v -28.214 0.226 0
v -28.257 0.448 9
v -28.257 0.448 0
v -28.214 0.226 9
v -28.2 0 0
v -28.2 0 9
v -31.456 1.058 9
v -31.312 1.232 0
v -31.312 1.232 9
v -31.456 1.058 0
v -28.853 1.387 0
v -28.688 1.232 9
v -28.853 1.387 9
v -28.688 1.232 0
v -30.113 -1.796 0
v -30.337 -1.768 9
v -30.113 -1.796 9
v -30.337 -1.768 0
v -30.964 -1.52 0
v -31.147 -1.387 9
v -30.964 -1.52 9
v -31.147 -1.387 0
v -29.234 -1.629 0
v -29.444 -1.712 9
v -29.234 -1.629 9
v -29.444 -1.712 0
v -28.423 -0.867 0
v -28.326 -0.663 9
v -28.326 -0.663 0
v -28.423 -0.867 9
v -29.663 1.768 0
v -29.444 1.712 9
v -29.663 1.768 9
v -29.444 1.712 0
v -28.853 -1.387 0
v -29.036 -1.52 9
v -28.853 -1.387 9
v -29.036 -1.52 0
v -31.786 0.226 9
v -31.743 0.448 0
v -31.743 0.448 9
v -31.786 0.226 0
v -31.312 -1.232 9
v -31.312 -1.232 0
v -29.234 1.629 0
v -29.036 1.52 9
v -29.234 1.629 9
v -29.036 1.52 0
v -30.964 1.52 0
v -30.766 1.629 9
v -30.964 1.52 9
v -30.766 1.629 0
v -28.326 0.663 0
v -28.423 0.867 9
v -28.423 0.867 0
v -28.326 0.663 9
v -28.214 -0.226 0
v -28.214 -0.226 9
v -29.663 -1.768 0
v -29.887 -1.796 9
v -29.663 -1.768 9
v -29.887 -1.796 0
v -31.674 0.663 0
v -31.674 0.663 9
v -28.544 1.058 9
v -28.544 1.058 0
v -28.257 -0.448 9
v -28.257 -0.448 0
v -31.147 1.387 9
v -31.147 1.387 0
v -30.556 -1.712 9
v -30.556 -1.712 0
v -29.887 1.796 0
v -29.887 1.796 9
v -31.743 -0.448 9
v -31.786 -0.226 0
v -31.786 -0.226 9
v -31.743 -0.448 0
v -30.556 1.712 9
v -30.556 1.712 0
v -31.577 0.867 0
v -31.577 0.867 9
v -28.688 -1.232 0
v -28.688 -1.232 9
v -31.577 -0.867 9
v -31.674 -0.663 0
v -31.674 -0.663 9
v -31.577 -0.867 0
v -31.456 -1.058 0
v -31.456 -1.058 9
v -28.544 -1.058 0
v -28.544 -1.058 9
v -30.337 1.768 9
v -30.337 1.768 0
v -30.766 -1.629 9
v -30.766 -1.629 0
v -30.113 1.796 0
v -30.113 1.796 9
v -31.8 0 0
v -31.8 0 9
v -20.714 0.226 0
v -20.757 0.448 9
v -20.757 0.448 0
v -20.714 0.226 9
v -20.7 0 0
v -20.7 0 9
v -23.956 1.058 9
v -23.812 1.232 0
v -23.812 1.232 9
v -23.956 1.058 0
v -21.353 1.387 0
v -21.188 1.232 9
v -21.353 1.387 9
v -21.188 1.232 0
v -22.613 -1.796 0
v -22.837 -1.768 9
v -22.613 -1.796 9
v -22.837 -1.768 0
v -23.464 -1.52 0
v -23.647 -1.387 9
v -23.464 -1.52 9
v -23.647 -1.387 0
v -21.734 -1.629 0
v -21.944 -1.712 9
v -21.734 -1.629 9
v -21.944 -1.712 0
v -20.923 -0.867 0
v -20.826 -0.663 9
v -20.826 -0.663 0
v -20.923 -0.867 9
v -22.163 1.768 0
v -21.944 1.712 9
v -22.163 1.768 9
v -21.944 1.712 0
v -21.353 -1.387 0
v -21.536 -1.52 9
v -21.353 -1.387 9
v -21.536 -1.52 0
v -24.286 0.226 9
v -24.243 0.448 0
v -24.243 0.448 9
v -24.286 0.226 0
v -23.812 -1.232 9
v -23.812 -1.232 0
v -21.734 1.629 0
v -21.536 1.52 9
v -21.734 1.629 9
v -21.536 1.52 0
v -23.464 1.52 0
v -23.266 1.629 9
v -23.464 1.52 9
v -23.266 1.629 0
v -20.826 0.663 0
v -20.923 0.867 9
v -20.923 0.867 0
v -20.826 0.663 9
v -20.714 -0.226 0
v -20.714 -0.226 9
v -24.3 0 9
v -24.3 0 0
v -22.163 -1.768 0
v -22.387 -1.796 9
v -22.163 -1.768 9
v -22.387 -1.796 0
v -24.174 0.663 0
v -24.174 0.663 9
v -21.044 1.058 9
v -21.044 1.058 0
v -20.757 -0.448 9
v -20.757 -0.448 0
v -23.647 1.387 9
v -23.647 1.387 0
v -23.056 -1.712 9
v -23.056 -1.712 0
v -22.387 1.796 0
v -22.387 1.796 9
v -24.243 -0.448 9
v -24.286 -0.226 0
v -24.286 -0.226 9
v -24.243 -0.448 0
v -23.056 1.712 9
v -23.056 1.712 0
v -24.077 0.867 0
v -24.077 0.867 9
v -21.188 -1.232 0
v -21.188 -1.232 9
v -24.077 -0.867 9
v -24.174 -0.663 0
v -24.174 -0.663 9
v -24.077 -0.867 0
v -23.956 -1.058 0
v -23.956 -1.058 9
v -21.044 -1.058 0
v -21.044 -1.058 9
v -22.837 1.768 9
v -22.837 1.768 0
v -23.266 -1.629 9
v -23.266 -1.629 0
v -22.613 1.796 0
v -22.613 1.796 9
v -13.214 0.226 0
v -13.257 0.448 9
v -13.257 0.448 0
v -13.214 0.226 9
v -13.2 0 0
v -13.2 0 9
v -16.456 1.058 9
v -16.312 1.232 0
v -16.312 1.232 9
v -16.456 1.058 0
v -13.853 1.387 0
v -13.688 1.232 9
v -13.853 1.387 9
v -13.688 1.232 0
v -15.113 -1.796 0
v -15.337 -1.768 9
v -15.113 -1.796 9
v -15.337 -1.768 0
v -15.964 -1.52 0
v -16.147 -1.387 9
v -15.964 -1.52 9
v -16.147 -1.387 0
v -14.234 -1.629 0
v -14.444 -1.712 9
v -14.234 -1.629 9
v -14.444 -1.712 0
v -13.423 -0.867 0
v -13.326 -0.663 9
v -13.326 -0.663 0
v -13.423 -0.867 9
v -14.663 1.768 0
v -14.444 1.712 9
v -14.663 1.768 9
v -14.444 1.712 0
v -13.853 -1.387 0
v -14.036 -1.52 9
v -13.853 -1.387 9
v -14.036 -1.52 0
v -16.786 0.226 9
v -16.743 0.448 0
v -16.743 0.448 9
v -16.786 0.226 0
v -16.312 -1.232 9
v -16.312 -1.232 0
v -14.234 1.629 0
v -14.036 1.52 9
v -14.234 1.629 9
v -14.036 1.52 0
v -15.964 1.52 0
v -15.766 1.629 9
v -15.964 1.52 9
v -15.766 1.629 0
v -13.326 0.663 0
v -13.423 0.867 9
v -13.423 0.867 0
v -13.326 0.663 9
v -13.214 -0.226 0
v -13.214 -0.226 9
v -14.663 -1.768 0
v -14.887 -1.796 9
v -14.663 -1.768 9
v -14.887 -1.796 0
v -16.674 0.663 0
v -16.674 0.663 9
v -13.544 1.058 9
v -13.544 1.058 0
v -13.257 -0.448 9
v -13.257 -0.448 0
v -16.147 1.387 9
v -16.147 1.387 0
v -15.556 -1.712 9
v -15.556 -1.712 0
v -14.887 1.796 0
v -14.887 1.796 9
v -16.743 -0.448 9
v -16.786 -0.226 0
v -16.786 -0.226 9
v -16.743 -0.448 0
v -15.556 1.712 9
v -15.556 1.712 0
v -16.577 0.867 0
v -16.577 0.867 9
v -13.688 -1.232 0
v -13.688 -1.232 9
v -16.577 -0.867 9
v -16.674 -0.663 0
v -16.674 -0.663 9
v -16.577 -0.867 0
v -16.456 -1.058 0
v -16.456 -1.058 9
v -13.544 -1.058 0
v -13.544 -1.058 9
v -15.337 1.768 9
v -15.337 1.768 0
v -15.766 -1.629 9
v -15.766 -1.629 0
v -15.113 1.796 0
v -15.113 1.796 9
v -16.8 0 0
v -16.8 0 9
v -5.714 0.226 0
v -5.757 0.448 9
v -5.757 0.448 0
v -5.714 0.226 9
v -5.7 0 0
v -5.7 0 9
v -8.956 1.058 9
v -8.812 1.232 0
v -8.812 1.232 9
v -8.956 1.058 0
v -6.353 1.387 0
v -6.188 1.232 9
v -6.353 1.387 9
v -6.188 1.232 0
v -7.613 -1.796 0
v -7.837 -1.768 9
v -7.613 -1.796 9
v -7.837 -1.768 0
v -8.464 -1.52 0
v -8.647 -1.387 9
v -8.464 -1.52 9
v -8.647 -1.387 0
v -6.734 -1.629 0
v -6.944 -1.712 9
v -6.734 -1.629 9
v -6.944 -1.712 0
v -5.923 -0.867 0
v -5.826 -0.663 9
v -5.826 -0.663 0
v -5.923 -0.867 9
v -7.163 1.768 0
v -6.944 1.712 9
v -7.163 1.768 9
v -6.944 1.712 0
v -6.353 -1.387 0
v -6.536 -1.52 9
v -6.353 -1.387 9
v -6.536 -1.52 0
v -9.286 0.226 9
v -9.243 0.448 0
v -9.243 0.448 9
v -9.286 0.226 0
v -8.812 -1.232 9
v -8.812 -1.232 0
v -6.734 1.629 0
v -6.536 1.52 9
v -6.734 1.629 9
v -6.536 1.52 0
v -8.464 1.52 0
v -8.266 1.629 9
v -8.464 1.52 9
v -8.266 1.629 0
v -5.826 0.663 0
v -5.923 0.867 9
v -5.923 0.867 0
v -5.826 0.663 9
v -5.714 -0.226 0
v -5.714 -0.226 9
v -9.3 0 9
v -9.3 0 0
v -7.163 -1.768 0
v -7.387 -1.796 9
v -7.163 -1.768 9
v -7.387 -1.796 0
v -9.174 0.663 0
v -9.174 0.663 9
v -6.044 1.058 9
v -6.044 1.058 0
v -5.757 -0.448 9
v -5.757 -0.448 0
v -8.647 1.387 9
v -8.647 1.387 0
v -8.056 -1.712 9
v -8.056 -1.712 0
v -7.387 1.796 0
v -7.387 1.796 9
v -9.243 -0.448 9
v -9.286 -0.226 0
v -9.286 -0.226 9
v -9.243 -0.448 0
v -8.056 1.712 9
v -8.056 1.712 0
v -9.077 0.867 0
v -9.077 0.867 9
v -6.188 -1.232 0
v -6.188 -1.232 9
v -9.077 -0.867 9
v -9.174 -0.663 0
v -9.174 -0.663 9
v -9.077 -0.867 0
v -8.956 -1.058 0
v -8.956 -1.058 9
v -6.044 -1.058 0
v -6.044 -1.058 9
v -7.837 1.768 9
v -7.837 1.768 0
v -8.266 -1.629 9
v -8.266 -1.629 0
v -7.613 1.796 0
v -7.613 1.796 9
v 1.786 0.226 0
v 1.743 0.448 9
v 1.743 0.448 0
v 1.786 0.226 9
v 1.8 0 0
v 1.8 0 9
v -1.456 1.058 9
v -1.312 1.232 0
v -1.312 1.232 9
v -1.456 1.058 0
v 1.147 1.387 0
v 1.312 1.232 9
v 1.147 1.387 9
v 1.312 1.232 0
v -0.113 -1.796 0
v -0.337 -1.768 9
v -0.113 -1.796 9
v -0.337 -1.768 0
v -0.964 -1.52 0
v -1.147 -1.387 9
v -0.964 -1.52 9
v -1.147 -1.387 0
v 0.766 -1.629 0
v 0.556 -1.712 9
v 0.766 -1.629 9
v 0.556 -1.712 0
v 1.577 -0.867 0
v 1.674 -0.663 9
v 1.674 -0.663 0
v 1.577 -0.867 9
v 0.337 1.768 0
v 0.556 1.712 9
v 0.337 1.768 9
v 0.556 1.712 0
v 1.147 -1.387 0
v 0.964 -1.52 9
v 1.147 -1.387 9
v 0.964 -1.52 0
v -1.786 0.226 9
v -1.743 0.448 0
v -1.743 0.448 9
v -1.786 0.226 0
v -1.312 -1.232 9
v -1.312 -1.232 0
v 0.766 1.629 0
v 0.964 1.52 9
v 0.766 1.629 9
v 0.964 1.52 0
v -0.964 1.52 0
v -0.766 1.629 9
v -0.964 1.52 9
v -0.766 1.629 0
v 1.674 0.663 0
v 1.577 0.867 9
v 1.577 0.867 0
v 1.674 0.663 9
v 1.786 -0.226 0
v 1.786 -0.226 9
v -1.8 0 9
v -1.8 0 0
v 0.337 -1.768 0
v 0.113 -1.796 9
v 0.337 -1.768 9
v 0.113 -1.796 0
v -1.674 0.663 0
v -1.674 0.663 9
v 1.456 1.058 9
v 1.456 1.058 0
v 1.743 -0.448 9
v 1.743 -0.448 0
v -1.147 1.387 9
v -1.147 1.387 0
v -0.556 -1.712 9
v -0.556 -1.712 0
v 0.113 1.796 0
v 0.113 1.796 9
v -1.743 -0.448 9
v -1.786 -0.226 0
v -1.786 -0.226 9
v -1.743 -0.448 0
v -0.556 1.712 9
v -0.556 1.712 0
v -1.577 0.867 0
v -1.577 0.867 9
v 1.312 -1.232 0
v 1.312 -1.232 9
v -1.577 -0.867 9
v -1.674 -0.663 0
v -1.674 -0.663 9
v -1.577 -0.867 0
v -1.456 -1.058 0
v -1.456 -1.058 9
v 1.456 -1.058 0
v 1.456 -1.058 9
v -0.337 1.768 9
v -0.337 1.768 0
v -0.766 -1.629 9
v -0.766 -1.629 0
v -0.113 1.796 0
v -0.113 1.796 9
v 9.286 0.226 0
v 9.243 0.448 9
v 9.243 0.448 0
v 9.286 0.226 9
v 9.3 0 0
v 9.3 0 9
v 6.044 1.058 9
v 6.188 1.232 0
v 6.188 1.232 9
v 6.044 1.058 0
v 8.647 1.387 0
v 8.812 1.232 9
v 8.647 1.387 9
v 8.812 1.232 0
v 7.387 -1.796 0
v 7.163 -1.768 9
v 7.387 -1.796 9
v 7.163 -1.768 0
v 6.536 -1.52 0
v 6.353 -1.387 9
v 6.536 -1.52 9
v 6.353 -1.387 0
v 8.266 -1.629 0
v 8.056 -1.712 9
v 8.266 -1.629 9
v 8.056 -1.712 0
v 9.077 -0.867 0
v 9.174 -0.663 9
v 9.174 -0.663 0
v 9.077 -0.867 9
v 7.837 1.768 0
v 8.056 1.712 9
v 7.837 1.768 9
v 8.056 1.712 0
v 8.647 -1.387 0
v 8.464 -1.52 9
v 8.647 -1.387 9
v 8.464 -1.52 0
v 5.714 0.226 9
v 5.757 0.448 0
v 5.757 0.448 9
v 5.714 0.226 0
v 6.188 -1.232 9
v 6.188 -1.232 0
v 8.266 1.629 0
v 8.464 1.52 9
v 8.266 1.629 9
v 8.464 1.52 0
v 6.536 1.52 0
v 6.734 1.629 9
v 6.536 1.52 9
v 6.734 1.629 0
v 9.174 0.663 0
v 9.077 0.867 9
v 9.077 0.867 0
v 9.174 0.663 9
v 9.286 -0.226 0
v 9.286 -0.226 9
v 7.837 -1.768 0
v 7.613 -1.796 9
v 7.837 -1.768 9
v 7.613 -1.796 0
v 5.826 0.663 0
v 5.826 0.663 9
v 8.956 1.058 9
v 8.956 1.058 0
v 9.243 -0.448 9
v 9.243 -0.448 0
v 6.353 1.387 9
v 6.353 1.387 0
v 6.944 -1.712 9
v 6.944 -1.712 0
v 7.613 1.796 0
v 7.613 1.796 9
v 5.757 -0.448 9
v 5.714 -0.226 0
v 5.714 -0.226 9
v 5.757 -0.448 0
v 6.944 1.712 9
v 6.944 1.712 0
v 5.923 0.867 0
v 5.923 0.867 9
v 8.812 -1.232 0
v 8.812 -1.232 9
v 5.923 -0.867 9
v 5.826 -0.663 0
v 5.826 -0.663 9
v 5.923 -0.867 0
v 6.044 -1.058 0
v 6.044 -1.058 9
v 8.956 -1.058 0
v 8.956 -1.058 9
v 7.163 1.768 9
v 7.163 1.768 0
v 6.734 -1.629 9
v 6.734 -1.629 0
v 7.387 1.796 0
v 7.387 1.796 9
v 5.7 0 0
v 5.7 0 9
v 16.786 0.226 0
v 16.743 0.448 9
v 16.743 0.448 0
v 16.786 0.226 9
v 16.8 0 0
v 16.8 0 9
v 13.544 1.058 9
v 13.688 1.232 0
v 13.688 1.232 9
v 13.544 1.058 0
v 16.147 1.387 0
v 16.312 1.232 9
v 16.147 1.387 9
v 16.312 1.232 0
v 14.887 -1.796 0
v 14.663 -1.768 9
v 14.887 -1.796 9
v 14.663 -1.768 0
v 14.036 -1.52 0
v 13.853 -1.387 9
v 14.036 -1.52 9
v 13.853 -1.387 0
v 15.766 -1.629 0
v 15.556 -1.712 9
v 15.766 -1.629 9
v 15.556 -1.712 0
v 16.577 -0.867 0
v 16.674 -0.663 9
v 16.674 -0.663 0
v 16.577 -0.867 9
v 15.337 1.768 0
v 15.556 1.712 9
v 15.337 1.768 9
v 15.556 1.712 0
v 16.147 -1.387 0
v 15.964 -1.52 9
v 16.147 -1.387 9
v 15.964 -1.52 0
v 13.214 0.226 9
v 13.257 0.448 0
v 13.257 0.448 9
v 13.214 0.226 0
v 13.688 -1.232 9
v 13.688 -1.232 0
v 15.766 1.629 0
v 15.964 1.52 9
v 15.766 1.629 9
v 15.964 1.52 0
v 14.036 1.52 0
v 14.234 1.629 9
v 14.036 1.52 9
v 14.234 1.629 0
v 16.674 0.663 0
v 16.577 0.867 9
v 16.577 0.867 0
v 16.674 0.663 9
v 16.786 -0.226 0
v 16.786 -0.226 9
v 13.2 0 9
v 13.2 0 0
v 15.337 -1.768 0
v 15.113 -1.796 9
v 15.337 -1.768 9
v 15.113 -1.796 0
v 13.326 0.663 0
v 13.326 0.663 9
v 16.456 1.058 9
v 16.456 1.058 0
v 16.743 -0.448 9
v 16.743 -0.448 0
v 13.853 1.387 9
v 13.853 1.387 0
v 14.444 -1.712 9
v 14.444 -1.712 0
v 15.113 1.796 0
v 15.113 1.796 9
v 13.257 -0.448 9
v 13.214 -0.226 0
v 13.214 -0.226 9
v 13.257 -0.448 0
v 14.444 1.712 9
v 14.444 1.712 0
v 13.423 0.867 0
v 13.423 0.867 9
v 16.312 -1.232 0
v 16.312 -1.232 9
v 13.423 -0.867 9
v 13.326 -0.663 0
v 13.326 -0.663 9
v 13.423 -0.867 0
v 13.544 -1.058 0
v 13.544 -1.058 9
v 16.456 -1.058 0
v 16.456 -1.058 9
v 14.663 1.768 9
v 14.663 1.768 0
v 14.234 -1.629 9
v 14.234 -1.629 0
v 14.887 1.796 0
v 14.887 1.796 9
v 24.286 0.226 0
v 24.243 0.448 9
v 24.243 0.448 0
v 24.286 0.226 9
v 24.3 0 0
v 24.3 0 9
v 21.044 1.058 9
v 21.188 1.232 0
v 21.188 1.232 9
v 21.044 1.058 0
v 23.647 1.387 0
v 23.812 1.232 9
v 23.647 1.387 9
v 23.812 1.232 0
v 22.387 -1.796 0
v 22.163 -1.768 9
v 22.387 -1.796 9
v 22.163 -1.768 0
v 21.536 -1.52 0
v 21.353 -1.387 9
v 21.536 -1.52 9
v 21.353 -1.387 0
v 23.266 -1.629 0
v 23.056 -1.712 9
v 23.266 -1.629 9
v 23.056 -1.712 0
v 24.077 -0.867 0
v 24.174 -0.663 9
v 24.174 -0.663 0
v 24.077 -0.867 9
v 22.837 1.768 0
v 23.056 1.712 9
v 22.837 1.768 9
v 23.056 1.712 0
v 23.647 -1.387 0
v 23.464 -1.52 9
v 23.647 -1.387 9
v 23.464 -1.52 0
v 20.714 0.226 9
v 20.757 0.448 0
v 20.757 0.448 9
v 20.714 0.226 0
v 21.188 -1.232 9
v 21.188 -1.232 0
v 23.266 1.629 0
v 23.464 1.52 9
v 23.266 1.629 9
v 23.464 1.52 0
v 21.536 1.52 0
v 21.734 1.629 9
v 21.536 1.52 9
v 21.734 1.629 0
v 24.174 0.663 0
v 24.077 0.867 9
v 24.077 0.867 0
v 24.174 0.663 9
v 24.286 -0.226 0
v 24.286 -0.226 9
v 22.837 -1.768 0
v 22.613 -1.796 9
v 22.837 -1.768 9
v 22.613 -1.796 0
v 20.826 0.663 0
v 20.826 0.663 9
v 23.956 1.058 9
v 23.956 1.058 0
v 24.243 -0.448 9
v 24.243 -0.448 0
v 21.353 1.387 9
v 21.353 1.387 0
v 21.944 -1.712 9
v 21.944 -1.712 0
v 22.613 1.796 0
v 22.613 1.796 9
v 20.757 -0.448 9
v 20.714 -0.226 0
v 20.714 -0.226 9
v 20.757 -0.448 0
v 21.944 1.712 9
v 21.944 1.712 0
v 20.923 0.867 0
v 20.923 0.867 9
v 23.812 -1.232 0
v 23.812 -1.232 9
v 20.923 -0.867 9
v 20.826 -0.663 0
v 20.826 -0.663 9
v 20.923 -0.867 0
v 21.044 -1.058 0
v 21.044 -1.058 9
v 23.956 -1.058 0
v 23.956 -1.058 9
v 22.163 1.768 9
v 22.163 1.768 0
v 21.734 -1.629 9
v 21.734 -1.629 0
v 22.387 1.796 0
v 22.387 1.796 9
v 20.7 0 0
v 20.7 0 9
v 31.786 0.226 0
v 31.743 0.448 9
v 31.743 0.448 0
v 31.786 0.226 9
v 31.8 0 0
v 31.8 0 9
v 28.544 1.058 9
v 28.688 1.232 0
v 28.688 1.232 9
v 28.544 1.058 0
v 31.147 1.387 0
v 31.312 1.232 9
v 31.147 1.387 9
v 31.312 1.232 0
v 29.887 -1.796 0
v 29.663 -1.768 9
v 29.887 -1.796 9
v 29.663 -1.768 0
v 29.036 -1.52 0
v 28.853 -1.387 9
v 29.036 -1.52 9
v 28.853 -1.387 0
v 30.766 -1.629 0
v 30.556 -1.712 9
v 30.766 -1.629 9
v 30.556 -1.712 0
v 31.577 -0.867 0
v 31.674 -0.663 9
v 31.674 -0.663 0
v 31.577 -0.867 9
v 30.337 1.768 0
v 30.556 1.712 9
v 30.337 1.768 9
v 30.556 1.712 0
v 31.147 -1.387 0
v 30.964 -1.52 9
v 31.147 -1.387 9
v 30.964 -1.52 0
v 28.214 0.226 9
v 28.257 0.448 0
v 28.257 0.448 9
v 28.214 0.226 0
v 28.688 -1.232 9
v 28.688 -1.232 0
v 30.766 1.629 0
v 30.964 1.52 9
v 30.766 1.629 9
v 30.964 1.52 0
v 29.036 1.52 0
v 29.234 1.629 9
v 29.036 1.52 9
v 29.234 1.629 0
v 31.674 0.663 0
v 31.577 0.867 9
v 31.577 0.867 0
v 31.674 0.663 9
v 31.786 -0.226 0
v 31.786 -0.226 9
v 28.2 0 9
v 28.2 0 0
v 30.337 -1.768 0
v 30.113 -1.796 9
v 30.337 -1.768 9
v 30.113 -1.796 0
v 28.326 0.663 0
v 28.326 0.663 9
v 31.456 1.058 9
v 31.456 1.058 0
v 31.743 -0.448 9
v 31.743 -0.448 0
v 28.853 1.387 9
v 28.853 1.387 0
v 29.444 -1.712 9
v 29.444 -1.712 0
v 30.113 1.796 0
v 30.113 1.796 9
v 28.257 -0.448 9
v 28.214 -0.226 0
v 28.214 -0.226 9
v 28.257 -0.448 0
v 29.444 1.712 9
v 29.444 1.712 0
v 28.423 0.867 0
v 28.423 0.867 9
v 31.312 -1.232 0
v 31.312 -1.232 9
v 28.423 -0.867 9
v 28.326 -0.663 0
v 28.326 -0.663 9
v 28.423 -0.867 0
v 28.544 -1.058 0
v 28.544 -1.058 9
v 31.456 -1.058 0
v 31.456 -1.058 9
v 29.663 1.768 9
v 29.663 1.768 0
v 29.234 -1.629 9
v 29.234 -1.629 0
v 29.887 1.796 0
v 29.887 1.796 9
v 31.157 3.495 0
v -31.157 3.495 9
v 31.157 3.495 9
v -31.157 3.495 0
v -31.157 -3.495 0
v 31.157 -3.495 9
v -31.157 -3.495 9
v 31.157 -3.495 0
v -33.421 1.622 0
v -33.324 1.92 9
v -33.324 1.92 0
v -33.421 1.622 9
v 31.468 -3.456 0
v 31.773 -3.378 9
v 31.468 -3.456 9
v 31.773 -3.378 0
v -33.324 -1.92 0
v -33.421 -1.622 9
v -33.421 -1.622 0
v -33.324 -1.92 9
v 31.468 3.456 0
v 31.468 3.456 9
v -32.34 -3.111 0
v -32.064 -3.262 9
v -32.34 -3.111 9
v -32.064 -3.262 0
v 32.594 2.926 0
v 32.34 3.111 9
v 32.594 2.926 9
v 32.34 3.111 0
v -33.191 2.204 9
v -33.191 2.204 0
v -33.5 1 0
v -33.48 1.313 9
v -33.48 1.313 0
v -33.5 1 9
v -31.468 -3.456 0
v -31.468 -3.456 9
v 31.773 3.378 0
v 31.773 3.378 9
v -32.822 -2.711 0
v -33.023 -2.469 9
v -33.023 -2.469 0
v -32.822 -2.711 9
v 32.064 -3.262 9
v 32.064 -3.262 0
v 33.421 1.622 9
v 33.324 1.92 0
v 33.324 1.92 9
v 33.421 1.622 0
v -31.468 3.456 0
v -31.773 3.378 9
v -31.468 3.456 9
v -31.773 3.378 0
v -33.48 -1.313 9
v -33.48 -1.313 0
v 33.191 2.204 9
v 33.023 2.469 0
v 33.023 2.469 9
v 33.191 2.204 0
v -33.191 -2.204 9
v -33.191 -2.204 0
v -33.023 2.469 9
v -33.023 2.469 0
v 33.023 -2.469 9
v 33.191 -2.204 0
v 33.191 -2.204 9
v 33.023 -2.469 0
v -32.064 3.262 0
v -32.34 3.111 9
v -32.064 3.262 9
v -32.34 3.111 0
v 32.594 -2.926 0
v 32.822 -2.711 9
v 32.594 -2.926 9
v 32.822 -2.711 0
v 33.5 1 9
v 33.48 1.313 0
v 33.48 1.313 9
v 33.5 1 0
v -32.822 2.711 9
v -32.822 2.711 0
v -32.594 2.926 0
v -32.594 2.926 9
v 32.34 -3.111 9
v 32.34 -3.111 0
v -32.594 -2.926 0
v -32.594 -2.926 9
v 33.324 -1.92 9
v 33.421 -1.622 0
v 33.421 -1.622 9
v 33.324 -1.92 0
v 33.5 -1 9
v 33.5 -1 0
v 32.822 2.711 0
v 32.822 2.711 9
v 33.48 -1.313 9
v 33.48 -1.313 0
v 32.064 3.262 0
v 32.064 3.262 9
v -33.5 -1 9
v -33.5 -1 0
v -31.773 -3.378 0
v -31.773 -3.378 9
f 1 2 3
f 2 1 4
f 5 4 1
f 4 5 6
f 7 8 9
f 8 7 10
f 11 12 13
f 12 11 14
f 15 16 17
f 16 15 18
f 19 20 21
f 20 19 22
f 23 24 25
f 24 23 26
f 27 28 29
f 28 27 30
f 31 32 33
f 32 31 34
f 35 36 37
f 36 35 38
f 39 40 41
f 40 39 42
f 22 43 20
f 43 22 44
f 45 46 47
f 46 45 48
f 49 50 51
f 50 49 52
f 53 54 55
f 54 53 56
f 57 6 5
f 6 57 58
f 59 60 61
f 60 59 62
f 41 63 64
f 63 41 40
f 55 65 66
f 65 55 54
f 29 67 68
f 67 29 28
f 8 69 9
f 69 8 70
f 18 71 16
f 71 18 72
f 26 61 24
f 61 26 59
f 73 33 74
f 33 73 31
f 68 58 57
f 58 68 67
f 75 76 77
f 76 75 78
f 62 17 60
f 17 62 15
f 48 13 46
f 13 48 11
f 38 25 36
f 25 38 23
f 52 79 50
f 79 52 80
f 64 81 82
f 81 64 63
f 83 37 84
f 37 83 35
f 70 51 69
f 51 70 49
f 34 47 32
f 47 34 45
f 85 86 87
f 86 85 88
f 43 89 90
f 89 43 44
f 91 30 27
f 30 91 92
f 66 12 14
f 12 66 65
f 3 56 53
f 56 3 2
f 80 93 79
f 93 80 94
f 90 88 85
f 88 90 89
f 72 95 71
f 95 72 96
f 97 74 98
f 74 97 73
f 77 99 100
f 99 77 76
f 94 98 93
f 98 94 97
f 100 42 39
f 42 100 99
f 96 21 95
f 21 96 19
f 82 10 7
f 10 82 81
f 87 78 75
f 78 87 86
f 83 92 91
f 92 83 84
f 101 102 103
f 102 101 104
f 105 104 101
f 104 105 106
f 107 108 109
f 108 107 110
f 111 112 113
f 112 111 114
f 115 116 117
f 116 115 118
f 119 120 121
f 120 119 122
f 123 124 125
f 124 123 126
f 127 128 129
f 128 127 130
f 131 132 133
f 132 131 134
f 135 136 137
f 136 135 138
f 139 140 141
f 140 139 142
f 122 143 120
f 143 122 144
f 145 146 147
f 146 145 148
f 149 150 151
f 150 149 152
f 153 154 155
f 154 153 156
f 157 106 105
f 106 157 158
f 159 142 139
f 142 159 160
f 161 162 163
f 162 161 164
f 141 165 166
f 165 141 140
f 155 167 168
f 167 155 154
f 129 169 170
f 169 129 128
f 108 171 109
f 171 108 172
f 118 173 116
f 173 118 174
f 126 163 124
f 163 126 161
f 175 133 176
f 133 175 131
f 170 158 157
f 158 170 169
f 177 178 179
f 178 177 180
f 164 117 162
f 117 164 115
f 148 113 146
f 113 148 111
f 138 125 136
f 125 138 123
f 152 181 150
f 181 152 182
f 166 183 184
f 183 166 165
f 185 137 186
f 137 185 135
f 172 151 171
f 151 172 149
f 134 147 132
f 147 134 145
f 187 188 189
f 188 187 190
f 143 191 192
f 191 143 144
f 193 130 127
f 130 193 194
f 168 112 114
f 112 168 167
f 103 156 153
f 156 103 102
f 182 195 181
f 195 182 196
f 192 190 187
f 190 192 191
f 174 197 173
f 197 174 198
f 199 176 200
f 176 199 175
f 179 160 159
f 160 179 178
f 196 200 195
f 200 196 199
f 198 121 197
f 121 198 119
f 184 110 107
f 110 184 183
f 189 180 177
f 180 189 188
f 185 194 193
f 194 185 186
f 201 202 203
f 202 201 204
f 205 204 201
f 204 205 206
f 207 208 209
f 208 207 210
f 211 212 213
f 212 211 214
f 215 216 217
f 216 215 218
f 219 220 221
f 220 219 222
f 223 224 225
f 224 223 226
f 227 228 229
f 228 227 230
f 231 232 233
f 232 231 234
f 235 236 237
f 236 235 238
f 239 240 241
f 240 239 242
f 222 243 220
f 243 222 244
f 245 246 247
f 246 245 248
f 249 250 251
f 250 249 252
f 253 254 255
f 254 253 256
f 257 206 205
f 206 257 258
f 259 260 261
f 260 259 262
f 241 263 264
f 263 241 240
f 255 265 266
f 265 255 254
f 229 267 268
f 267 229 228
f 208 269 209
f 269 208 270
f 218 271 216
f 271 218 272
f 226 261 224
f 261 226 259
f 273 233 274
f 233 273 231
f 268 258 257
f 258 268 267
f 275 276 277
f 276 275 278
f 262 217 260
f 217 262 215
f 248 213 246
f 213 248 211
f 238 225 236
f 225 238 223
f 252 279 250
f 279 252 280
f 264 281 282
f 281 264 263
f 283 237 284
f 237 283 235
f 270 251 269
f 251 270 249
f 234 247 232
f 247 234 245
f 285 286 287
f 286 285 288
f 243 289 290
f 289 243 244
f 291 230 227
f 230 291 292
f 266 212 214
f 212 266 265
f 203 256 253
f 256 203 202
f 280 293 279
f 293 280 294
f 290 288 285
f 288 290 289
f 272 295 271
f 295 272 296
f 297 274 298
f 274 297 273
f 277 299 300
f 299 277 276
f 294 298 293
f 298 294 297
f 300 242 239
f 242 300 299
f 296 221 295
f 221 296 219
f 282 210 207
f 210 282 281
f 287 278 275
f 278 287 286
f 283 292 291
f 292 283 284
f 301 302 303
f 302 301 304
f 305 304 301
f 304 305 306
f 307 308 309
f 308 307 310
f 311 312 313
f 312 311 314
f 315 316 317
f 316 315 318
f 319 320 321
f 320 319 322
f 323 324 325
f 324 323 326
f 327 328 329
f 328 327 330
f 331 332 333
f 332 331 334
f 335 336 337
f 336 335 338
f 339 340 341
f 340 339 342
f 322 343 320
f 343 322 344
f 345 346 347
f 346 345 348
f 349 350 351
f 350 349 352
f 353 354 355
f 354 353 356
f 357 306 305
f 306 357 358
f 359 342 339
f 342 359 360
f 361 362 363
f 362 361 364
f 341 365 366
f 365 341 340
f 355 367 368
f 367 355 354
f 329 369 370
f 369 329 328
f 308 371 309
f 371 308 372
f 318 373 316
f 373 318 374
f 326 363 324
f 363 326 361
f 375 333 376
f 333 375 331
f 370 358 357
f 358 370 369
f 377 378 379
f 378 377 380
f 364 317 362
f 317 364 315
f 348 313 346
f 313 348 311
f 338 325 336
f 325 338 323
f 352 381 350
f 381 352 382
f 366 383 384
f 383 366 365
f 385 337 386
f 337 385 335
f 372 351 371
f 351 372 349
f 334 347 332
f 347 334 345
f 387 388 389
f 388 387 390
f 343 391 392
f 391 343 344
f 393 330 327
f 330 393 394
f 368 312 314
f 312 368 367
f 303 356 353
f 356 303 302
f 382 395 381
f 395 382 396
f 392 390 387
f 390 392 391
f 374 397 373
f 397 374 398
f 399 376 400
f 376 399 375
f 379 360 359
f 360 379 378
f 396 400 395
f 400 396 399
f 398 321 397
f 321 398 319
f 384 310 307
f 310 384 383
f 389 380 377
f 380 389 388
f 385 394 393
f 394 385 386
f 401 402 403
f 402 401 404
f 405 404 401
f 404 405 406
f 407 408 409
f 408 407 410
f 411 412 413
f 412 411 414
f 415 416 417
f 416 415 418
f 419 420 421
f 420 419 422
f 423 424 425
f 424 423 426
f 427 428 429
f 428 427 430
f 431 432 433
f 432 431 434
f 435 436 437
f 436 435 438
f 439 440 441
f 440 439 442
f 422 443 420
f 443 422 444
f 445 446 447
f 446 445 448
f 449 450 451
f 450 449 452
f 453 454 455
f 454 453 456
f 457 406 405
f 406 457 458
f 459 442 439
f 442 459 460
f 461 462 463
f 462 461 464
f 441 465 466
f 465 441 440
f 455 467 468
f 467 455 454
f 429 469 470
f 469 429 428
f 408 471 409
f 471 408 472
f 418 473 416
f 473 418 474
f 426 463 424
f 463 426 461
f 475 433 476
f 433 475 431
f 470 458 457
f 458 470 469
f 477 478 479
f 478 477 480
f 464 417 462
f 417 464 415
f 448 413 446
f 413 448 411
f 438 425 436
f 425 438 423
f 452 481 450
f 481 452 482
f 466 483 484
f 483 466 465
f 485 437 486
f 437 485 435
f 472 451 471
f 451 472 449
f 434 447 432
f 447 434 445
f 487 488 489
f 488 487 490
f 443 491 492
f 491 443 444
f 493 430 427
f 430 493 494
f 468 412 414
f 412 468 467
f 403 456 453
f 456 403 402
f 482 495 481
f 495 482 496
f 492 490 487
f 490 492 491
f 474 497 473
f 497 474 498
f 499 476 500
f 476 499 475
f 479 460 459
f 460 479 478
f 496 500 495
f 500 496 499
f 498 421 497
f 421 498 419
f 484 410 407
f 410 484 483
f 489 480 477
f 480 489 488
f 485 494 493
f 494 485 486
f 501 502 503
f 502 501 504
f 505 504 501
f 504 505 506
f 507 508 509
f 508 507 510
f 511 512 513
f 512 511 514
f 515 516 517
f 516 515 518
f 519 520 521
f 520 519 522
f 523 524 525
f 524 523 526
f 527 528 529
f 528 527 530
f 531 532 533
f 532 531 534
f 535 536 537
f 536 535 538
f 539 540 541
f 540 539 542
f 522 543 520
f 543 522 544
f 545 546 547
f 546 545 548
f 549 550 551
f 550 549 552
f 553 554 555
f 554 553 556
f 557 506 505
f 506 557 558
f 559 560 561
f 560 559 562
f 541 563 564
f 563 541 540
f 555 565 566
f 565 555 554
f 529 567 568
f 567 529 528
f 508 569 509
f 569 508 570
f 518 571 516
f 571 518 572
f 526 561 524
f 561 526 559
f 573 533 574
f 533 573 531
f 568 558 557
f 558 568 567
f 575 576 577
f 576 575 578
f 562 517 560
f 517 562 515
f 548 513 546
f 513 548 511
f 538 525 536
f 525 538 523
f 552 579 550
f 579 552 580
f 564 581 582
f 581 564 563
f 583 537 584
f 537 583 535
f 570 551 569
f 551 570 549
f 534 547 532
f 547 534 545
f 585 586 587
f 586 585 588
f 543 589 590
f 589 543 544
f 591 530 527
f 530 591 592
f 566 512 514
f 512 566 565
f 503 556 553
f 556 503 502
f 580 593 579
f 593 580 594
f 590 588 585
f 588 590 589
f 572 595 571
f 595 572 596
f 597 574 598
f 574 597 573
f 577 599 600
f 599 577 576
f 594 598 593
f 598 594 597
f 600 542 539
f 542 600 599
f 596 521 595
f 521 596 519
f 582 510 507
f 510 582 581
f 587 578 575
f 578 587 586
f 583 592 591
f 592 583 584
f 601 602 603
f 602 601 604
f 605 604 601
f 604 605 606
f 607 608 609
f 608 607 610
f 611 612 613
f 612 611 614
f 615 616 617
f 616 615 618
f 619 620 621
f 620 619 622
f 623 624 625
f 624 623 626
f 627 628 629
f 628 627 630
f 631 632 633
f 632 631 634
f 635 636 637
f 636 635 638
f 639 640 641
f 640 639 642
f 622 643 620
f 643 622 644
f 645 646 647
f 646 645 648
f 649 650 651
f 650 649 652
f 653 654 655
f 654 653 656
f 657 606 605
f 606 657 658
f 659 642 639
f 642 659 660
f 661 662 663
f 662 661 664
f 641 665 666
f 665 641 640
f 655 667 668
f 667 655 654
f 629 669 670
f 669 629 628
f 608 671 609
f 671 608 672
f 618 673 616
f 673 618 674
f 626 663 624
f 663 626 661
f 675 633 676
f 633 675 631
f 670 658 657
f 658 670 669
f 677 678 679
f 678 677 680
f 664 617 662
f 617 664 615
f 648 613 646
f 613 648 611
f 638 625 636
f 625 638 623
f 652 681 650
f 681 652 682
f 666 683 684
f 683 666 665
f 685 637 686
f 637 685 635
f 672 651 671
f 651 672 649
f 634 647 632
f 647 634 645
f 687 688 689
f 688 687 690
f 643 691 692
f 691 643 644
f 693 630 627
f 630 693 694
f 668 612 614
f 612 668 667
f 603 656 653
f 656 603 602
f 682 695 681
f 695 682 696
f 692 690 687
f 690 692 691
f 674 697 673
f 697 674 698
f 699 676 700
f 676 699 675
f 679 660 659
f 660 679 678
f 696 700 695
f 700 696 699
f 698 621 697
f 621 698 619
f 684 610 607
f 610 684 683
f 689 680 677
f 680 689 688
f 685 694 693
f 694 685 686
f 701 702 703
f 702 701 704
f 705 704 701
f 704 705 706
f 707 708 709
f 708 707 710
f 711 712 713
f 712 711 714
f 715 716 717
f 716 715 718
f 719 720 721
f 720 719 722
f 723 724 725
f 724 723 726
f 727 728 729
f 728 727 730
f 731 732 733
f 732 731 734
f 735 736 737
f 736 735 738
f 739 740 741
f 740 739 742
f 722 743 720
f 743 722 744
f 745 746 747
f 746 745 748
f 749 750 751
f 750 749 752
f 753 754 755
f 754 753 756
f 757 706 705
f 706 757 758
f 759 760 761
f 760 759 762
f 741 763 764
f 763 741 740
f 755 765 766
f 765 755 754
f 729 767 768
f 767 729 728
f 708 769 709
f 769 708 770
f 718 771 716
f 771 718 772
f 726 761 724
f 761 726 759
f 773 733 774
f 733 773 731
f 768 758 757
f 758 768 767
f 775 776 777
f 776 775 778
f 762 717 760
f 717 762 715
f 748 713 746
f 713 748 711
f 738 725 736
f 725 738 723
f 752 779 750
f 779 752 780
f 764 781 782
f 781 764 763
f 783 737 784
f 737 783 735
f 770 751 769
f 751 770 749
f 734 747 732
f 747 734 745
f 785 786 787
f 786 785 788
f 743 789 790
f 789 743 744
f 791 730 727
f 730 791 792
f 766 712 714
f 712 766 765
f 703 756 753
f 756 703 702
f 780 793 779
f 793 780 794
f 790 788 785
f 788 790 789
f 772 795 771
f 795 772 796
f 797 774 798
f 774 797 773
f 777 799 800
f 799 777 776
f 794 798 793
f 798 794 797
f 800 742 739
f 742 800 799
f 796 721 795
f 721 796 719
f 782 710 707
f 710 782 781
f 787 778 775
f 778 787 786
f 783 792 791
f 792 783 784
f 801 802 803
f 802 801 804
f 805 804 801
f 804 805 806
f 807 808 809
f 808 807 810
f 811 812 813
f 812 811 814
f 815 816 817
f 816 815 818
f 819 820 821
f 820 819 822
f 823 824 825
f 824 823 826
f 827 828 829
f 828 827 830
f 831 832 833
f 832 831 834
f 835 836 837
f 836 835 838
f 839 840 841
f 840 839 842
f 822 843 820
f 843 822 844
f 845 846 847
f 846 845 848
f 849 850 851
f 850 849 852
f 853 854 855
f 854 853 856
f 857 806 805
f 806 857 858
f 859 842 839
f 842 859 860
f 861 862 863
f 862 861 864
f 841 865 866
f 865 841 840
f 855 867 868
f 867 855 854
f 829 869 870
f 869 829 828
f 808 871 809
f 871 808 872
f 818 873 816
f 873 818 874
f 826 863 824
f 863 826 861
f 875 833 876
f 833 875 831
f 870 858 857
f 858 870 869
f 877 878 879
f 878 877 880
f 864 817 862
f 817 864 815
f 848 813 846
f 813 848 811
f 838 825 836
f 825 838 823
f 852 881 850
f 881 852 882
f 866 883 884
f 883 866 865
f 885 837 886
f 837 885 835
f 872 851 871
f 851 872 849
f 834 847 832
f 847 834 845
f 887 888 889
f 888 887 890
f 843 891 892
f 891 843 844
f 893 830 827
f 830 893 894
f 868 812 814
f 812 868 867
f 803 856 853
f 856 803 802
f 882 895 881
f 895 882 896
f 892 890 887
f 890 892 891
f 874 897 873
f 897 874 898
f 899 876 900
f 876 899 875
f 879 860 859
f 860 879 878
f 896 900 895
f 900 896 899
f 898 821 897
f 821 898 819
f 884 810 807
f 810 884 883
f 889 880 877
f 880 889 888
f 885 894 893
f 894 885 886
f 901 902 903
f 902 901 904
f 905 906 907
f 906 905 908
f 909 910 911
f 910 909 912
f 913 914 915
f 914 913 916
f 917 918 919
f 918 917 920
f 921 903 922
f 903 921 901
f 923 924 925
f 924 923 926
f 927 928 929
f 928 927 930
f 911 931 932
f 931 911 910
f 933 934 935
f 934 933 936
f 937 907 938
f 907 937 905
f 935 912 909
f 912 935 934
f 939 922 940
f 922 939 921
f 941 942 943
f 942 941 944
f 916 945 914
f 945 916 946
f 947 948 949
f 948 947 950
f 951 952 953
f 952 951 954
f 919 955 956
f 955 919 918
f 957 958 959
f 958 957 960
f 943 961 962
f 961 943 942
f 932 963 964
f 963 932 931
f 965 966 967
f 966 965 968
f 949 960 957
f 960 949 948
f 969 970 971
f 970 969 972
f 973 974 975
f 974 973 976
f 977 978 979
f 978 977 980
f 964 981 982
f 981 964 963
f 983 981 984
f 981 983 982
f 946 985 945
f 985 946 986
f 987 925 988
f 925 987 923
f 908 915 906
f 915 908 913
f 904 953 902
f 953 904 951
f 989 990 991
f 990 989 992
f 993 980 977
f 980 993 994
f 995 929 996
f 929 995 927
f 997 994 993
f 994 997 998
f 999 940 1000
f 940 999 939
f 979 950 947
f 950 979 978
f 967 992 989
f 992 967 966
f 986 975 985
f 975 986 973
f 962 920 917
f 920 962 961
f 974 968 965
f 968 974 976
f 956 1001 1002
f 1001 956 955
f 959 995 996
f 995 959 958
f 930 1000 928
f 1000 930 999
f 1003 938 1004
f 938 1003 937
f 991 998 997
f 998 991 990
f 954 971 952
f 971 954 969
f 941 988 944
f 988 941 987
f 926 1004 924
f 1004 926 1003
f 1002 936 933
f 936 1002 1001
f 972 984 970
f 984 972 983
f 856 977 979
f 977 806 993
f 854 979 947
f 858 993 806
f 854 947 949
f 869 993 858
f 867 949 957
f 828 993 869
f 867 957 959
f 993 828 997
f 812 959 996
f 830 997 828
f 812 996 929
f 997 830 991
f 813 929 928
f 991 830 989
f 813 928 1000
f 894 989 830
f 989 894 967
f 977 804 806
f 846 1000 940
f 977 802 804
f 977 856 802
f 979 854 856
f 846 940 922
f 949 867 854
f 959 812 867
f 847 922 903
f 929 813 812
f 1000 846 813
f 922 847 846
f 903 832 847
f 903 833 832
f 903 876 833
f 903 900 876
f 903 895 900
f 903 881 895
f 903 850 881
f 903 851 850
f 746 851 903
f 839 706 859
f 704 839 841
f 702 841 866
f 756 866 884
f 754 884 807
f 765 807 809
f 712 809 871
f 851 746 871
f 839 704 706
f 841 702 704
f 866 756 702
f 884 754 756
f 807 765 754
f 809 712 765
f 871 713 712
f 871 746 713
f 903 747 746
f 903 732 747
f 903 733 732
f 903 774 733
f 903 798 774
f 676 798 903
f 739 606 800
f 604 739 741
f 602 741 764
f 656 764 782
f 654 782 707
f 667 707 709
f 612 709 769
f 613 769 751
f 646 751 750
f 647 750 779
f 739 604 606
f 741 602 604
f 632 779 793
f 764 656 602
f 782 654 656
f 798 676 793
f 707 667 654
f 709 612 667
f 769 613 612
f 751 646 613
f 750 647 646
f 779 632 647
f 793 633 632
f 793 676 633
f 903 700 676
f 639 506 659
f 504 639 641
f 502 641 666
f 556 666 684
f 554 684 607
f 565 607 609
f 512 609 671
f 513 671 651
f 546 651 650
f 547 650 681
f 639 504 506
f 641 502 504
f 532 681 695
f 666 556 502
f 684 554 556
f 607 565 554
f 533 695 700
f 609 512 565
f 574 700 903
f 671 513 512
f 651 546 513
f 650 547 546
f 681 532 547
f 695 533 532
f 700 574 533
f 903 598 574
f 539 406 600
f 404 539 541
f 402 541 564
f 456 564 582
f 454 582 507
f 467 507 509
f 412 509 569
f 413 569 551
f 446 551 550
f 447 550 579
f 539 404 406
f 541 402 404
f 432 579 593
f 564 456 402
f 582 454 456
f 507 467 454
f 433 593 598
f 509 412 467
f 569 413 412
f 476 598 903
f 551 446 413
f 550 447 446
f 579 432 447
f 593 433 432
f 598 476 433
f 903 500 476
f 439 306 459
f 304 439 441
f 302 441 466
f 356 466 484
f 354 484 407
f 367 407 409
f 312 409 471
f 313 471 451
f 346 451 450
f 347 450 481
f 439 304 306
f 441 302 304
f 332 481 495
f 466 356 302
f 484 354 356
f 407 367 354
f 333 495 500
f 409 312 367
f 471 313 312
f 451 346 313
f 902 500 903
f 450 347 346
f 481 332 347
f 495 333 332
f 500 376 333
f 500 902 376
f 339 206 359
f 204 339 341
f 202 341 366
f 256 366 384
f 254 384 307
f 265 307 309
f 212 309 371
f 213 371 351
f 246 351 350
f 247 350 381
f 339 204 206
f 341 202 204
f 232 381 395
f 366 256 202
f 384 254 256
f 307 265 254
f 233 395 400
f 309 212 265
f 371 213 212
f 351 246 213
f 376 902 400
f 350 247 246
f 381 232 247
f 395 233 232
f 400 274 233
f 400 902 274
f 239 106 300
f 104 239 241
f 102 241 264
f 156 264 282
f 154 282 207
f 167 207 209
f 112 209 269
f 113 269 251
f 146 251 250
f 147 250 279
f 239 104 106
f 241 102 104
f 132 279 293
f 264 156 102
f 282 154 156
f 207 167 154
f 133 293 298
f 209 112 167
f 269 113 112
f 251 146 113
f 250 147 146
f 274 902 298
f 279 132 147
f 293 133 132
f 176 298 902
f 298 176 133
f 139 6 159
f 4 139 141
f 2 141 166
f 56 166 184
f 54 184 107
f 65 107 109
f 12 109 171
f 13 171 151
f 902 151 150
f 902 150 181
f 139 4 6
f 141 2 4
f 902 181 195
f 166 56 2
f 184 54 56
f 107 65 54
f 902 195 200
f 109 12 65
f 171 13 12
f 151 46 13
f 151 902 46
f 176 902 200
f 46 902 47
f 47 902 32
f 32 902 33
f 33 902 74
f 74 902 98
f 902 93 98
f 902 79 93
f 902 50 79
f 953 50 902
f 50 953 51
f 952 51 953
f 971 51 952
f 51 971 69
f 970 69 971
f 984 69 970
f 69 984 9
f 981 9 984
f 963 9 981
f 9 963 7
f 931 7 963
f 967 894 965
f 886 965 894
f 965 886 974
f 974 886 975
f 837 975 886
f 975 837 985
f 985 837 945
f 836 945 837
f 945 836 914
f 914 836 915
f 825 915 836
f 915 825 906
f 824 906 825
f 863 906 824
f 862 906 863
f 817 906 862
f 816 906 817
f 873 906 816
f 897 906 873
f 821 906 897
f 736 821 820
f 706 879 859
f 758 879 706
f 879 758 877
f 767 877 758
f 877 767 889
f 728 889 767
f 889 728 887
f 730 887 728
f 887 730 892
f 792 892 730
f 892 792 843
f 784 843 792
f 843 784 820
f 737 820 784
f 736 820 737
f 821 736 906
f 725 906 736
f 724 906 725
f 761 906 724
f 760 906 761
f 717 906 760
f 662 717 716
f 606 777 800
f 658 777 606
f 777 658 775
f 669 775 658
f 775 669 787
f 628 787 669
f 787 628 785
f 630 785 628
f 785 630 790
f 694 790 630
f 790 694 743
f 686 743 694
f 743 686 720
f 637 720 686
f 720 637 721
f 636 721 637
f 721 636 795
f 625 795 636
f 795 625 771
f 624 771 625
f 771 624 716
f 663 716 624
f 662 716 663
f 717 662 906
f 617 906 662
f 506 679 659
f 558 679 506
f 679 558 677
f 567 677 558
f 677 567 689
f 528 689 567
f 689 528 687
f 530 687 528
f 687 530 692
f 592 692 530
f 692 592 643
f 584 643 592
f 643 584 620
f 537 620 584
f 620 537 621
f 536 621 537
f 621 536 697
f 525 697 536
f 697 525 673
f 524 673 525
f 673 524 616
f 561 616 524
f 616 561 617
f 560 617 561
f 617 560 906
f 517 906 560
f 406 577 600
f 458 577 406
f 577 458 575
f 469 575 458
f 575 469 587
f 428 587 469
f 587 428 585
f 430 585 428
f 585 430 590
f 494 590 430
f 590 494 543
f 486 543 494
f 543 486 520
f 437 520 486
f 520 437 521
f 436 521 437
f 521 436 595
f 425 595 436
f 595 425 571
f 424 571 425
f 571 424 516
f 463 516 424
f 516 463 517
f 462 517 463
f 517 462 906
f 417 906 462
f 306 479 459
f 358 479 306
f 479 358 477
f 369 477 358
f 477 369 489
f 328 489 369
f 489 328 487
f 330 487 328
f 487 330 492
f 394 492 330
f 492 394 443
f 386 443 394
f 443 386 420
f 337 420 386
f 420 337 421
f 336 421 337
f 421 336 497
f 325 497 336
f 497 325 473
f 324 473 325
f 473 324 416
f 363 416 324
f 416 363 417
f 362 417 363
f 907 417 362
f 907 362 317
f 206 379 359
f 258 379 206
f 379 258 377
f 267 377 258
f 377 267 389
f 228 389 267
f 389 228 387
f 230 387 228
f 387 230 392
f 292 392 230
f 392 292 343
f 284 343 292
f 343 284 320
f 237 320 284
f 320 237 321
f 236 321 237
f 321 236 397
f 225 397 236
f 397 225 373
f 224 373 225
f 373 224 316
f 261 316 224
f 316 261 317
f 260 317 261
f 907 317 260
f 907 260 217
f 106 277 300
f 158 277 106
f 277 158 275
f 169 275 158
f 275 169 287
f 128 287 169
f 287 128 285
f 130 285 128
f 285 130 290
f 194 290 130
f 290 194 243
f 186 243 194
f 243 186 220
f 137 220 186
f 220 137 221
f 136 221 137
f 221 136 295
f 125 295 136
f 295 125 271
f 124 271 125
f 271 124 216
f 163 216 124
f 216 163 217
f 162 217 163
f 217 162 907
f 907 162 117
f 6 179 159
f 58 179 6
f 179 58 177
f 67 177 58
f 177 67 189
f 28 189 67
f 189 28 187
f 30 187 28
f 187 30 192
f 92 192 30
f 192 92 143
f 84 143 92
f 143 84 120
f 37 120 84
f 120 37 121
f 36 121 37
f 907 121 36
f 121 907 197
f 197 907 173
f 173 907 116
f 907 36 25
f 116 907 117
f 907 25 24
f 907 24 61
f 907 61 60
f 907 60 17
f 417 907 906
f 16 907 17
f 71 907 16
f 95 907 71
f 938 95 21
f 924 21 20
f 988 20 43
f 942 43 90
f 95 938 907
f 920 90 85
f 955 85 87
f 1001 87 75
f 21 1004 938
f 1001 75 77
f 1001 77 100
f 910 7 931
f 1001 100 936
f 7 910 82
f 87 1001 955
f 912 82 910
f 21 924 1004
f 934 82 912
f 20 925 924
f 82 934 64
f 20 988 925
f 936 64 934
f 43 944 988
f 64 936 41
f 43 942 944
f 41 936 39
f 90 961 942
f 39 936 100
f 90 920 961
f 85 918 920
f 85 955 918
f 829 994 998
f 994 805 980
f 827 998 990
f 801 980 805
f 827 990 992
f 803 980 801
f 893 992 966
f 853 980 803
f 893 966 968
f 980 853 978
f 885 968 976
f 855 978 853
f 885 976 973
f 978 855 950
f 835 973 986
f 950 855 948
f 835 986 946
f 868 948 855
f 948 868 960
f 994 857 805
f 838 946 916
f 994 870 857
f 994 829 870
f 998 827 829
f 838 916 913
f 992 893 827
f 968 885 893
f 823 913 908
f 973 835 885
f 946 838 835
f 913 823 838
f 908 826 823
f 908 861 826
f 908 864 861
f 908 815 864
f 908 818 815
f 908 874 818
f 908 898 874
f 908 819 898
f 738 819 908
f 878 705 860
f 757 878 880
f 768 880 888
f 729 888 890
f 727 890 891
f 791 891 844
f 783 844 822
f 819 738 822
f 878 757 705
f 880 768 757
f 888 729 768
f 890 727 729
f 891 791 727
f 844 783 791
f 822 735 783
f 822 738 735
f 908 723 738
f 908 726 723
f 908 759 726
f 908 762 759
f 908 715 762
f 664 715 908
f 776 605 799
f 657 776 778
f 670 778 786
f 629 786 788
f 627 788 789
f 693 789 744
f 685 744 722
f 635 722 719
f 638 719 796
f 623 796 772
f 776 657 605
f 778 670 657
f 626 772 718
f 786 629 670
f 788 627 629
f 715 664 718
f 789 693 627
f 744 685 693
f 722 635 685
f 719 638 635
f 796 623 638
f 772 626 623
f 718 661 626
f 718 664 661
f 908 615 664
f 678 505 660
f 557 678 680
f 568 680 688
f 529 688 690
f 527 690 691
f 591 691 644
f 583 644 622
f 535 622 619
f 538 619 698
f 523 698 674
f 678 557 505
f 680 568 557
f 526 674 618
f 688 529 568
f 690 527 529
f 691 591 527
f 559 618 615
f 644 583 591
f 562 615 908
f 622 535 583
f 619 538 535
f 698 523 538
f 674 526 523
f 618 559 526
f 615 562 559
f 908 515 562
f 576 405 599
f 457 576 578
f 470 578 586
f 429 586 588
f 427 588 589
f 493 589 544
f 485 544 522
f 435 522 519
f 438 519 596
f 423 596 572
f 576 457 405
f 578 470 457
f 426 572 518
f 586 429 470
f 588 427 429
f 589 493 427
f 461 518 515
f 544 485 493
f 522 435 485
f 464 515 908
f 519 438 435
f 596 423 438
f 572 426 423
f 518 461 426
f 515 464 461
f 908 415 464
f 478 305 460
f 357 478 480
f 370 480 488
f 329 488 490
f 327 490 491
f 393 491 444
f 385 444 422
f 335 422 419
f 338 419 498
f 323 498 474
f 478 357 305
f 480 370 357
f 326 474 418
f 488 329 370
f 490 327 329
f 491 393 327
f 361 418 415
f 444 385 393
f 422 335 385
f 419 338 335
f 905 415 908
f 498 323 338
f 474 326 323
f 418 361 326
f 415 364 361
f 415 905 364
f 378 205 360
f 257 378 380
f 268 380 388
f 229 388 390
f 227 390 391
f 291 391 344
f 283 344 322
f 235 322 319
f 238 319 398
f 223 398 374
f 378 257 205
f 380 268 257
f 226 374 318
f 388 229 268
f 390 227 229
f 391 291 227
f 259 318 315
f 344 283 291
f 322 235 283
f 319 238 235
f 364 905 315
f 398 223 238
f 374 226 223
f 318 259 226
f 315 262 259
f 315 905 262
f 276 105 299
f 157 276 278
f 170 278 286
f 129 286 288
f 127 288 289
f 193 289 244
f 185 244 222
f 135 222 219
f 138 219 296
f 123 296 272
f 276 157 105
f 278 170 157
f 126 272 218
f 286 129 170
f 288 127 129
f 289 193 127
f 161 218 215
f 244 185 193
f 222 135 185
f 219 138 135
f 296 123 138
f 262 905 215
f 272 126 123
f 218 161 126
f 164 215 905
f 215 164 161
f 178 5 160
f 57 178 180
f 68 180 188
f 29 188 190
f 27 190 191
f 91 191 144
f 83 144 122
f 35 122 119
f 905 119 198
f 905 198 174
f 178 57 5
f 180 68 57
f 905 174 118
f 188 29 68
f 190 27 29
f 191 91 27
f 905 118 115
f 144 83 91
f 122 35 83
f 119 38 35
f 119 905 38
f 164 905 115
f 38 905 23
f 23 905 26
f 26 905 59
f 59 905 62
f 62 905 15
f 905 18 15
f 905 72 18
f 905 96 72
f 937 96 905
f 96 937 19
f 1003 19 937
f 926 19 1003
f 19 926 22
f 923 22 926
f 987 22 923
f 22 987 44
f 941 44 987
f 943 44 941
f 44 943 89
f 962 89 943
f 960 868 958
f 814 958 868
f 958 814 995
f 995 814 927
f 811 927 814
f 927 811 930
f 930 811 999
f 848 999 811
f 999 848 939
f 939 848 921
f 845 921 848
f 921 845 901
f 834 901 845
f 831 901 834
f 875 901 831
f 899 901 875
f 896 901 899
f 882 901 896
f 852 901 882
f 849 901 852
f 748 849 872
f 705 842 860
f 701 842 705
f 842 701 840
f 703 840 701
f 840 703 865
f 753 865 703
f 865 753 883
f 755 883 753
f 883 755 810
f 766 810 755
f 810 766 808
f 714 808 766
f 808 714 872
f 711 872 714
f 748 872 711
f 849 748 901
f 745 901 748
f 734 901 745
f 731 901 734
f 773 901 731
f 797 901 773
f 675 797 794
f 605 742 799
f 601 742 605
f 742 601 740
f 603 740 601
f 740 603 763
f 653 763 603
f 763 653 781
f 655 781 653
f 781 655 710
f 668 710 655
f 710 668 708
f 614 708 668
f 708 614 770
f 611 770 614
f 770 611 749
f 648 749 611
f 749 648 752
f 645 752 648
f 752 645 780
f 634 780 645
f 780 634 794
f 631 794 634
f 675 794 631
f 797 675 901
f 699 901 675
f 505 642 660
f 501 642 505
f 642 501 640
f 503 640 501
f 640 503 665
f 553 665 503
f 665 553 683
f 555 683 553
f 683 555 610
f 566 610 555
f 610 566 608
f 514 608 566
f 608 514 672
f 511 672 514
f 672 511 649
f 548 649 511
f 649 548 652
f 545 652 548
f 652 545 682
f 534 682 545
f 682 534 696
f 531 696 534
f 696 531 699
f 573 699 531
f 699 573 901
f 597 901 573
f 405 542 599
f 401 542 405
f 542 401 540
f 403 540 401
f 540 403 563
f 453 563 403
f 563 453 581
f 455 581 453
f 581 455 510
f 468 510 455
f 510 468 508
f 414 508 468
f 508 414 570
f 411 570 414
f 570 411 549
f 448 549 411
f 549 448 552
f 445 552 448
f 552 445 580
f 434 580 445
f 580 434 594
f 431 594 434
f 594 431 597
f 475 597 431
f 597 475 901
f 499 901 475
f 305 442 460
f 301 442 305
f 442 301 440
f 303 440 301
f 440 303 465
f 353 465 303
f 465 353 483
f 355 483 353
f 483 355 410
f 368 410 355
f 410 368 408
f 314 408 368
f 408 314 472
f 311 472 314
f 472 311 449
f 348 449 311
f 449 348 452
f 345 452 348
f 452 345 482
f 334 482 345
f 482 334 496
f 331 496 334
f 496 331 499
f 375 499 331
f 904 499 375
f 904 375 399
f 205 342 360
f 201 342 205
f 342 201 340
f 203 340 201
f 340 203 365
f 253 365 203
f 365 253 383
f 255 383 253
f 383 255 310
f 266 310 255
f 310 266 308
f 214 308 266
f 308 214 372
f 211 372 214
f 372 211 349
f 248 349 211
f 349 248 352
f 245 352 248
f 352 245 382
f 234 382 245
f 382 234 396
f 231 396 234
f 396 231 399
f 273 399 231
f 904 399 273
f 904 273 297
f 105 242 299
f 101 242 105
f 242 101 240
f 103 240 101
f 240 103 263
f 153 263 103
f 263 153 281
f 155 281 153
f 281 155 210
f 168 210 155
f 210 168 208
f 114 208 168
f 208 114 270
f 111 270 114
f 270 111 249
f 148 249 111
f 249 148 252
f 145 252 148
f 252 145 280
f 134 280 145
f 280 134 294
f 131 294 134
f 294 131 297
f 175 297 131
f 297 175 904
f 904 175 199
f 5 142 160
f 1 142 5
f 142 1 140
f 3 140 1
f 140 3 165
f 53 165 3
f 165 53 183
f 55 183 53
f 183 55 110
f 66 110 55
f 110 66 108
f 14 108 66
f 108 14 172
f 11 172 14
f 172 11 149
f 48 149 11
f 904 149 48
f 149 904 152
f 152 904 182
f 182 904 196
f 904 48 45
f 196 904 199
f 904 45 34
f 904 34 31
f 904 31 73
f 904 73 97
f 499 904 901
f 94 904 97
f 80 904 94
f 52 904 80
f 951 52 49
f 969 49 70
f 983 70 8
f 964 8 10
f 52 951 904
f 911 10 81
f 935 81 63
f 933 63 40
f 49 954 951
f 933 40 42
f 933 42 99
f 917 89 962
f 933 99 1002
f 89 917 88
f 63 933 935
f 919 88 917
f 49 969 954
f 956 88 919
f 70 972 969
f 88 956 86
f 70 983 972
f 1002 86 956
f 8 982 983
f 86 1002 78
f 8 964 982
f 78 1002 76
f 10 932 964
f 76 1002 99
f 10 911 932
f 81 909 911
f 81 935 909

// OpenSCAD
$fn = 50;


difference() {
	union() {
		translate(v = [0, 0, 0]) {
			rotate(a = [0, 0, 0]) {
				hull() {
					translate(v = [-31.0000000000, 1.0000000000, 0]) {
						rotate(a = [0, 0, 0]) {
							translate(v = [0, 0, 0]) {
								rotate(a = [0, 0, 0]) {
									cylinder(h = 9, r = 2.5000000000);
								}
							}
						}
					}
					translate(v = [31.0000000000, 1.0000000000, 0]) {
						rotate(a = [0, 0, 0]) {
							translate(v = [0, 0, 0]) {
								rotate(a = [0, 0, 0]) {
									cylinder(h = 9, r = 2.5000000000);
								}
							}
						}
					}
					translate(v = [-31.0000000000, -1.0000000000, 0]) {
						rotate(a = [0, 0, 0]) {
							translate(v = [0, 0, 0]) {
								rotate(a = [0, 0, 0]) {
									cylinder(h = 9, r = 2.5000000000);
								}
							}
						}
					}
					translate(v = [31.0000000000, -1.0000000000, 0]) {
						rotate(a = [0, 0, 0]) {
							translate(v = [0, 0, 0]) {
								rotate(a = [0, 0, 0]) {
									cylinder(h = 9, r = 2.5000000000);
								}
							}
						}
					}
				}
			}
		}
	}
	union() {
		translate(v = [-30.0000000000, 0.0000000000, 0]) {
			rotate(a = [0, 0, 0]) {
				translate(v = [0, 0, -50]) {
					rotate(a = [0, 0, 0]) {
						cylinder(h = 100, r = 1.8000000000);
					}
				}
			}
		}
		translate(v = [-22.5000000000, 0.0000000000, 0]) {
			rotate(a = [0, 0, 0]) {
				translate(v = [0, 0, -50]) {
					rotate(a = [0, 0, 0]) {
						cylinder(h = 100, r = 1.8000000000);
					}
				}
			}
		}
		translate(v = [-15.0000000000, 0.0000000000, 0]) {
			rotate(a = [0, 0, 0]) {
				translate(v = [0, 0, -50]) {
					rotate(a = [0, 0, 0]) {
						cylinder(h = 100, r = 1.8000000000);
					}
				}
			}
		}
		translate(v = [-7.5000000000, 0.0000000000, 0]) {
			rotate(a = [0, 0, 0]) {
				translate(v = [0, 0, -50]) {
					rotate(a = [0, 0, 0]) {
						cylinder(h = 100, r = 1.8000000000);
					}
				}
			}
		}
		translate(v = [0.0000000000, 0.0000000000, 0]) {
			rotate(a = [0, 0, 0]) {
				translate(v = [0, 0, -50]) {
					rotate(a = [0, 0, 0]) {
						cylinder(h = 100, r = 1.8000000000);
					}
				}
			}
		}
		translate(v = [7.5000000000, 0.0000000000, 0]) {
			rotate(a = [0, 0, 0]) {
				translate(v = [0, 0, -50]) {
					rotate(a = [0, 0, 0]) {
						cylinder(h = 100, r = 1.8000000000);
					}
				}
			}
		}
		translate(v = [15.0000000000, 0.0000000000, 0]) {
			rotate(a = [0, 0, 0]) {
				translate(v = [0, 0, -50]) {
					rotate(a = [0, 0, 0]) {
						cylinder(h = 100, r = 1.8000000000);
					}
				}
			}
		}
		translate(v = [22.5000000000, 0.0000000000, 0]) {
			rotate(a = [0, 0, 0]) {
				translate(v = [0, 0, -50]) {
					rotate(a = [0, 0, 0]) {
						cylinder(h = 100, r = 1.8000000000);
					}
				}
			}
		}
		translate(v = [30.0000000000, 0.0000000000, 0]) {
			rotate(a = [0, 0, 0]) {
				translate(v = [0, 0, -50]) {
					rotate(a = [0, 0, 0]) {
						cylinder(h = 100, r = 1.8000000000);
					}
				}
			}
		}
	}
}
